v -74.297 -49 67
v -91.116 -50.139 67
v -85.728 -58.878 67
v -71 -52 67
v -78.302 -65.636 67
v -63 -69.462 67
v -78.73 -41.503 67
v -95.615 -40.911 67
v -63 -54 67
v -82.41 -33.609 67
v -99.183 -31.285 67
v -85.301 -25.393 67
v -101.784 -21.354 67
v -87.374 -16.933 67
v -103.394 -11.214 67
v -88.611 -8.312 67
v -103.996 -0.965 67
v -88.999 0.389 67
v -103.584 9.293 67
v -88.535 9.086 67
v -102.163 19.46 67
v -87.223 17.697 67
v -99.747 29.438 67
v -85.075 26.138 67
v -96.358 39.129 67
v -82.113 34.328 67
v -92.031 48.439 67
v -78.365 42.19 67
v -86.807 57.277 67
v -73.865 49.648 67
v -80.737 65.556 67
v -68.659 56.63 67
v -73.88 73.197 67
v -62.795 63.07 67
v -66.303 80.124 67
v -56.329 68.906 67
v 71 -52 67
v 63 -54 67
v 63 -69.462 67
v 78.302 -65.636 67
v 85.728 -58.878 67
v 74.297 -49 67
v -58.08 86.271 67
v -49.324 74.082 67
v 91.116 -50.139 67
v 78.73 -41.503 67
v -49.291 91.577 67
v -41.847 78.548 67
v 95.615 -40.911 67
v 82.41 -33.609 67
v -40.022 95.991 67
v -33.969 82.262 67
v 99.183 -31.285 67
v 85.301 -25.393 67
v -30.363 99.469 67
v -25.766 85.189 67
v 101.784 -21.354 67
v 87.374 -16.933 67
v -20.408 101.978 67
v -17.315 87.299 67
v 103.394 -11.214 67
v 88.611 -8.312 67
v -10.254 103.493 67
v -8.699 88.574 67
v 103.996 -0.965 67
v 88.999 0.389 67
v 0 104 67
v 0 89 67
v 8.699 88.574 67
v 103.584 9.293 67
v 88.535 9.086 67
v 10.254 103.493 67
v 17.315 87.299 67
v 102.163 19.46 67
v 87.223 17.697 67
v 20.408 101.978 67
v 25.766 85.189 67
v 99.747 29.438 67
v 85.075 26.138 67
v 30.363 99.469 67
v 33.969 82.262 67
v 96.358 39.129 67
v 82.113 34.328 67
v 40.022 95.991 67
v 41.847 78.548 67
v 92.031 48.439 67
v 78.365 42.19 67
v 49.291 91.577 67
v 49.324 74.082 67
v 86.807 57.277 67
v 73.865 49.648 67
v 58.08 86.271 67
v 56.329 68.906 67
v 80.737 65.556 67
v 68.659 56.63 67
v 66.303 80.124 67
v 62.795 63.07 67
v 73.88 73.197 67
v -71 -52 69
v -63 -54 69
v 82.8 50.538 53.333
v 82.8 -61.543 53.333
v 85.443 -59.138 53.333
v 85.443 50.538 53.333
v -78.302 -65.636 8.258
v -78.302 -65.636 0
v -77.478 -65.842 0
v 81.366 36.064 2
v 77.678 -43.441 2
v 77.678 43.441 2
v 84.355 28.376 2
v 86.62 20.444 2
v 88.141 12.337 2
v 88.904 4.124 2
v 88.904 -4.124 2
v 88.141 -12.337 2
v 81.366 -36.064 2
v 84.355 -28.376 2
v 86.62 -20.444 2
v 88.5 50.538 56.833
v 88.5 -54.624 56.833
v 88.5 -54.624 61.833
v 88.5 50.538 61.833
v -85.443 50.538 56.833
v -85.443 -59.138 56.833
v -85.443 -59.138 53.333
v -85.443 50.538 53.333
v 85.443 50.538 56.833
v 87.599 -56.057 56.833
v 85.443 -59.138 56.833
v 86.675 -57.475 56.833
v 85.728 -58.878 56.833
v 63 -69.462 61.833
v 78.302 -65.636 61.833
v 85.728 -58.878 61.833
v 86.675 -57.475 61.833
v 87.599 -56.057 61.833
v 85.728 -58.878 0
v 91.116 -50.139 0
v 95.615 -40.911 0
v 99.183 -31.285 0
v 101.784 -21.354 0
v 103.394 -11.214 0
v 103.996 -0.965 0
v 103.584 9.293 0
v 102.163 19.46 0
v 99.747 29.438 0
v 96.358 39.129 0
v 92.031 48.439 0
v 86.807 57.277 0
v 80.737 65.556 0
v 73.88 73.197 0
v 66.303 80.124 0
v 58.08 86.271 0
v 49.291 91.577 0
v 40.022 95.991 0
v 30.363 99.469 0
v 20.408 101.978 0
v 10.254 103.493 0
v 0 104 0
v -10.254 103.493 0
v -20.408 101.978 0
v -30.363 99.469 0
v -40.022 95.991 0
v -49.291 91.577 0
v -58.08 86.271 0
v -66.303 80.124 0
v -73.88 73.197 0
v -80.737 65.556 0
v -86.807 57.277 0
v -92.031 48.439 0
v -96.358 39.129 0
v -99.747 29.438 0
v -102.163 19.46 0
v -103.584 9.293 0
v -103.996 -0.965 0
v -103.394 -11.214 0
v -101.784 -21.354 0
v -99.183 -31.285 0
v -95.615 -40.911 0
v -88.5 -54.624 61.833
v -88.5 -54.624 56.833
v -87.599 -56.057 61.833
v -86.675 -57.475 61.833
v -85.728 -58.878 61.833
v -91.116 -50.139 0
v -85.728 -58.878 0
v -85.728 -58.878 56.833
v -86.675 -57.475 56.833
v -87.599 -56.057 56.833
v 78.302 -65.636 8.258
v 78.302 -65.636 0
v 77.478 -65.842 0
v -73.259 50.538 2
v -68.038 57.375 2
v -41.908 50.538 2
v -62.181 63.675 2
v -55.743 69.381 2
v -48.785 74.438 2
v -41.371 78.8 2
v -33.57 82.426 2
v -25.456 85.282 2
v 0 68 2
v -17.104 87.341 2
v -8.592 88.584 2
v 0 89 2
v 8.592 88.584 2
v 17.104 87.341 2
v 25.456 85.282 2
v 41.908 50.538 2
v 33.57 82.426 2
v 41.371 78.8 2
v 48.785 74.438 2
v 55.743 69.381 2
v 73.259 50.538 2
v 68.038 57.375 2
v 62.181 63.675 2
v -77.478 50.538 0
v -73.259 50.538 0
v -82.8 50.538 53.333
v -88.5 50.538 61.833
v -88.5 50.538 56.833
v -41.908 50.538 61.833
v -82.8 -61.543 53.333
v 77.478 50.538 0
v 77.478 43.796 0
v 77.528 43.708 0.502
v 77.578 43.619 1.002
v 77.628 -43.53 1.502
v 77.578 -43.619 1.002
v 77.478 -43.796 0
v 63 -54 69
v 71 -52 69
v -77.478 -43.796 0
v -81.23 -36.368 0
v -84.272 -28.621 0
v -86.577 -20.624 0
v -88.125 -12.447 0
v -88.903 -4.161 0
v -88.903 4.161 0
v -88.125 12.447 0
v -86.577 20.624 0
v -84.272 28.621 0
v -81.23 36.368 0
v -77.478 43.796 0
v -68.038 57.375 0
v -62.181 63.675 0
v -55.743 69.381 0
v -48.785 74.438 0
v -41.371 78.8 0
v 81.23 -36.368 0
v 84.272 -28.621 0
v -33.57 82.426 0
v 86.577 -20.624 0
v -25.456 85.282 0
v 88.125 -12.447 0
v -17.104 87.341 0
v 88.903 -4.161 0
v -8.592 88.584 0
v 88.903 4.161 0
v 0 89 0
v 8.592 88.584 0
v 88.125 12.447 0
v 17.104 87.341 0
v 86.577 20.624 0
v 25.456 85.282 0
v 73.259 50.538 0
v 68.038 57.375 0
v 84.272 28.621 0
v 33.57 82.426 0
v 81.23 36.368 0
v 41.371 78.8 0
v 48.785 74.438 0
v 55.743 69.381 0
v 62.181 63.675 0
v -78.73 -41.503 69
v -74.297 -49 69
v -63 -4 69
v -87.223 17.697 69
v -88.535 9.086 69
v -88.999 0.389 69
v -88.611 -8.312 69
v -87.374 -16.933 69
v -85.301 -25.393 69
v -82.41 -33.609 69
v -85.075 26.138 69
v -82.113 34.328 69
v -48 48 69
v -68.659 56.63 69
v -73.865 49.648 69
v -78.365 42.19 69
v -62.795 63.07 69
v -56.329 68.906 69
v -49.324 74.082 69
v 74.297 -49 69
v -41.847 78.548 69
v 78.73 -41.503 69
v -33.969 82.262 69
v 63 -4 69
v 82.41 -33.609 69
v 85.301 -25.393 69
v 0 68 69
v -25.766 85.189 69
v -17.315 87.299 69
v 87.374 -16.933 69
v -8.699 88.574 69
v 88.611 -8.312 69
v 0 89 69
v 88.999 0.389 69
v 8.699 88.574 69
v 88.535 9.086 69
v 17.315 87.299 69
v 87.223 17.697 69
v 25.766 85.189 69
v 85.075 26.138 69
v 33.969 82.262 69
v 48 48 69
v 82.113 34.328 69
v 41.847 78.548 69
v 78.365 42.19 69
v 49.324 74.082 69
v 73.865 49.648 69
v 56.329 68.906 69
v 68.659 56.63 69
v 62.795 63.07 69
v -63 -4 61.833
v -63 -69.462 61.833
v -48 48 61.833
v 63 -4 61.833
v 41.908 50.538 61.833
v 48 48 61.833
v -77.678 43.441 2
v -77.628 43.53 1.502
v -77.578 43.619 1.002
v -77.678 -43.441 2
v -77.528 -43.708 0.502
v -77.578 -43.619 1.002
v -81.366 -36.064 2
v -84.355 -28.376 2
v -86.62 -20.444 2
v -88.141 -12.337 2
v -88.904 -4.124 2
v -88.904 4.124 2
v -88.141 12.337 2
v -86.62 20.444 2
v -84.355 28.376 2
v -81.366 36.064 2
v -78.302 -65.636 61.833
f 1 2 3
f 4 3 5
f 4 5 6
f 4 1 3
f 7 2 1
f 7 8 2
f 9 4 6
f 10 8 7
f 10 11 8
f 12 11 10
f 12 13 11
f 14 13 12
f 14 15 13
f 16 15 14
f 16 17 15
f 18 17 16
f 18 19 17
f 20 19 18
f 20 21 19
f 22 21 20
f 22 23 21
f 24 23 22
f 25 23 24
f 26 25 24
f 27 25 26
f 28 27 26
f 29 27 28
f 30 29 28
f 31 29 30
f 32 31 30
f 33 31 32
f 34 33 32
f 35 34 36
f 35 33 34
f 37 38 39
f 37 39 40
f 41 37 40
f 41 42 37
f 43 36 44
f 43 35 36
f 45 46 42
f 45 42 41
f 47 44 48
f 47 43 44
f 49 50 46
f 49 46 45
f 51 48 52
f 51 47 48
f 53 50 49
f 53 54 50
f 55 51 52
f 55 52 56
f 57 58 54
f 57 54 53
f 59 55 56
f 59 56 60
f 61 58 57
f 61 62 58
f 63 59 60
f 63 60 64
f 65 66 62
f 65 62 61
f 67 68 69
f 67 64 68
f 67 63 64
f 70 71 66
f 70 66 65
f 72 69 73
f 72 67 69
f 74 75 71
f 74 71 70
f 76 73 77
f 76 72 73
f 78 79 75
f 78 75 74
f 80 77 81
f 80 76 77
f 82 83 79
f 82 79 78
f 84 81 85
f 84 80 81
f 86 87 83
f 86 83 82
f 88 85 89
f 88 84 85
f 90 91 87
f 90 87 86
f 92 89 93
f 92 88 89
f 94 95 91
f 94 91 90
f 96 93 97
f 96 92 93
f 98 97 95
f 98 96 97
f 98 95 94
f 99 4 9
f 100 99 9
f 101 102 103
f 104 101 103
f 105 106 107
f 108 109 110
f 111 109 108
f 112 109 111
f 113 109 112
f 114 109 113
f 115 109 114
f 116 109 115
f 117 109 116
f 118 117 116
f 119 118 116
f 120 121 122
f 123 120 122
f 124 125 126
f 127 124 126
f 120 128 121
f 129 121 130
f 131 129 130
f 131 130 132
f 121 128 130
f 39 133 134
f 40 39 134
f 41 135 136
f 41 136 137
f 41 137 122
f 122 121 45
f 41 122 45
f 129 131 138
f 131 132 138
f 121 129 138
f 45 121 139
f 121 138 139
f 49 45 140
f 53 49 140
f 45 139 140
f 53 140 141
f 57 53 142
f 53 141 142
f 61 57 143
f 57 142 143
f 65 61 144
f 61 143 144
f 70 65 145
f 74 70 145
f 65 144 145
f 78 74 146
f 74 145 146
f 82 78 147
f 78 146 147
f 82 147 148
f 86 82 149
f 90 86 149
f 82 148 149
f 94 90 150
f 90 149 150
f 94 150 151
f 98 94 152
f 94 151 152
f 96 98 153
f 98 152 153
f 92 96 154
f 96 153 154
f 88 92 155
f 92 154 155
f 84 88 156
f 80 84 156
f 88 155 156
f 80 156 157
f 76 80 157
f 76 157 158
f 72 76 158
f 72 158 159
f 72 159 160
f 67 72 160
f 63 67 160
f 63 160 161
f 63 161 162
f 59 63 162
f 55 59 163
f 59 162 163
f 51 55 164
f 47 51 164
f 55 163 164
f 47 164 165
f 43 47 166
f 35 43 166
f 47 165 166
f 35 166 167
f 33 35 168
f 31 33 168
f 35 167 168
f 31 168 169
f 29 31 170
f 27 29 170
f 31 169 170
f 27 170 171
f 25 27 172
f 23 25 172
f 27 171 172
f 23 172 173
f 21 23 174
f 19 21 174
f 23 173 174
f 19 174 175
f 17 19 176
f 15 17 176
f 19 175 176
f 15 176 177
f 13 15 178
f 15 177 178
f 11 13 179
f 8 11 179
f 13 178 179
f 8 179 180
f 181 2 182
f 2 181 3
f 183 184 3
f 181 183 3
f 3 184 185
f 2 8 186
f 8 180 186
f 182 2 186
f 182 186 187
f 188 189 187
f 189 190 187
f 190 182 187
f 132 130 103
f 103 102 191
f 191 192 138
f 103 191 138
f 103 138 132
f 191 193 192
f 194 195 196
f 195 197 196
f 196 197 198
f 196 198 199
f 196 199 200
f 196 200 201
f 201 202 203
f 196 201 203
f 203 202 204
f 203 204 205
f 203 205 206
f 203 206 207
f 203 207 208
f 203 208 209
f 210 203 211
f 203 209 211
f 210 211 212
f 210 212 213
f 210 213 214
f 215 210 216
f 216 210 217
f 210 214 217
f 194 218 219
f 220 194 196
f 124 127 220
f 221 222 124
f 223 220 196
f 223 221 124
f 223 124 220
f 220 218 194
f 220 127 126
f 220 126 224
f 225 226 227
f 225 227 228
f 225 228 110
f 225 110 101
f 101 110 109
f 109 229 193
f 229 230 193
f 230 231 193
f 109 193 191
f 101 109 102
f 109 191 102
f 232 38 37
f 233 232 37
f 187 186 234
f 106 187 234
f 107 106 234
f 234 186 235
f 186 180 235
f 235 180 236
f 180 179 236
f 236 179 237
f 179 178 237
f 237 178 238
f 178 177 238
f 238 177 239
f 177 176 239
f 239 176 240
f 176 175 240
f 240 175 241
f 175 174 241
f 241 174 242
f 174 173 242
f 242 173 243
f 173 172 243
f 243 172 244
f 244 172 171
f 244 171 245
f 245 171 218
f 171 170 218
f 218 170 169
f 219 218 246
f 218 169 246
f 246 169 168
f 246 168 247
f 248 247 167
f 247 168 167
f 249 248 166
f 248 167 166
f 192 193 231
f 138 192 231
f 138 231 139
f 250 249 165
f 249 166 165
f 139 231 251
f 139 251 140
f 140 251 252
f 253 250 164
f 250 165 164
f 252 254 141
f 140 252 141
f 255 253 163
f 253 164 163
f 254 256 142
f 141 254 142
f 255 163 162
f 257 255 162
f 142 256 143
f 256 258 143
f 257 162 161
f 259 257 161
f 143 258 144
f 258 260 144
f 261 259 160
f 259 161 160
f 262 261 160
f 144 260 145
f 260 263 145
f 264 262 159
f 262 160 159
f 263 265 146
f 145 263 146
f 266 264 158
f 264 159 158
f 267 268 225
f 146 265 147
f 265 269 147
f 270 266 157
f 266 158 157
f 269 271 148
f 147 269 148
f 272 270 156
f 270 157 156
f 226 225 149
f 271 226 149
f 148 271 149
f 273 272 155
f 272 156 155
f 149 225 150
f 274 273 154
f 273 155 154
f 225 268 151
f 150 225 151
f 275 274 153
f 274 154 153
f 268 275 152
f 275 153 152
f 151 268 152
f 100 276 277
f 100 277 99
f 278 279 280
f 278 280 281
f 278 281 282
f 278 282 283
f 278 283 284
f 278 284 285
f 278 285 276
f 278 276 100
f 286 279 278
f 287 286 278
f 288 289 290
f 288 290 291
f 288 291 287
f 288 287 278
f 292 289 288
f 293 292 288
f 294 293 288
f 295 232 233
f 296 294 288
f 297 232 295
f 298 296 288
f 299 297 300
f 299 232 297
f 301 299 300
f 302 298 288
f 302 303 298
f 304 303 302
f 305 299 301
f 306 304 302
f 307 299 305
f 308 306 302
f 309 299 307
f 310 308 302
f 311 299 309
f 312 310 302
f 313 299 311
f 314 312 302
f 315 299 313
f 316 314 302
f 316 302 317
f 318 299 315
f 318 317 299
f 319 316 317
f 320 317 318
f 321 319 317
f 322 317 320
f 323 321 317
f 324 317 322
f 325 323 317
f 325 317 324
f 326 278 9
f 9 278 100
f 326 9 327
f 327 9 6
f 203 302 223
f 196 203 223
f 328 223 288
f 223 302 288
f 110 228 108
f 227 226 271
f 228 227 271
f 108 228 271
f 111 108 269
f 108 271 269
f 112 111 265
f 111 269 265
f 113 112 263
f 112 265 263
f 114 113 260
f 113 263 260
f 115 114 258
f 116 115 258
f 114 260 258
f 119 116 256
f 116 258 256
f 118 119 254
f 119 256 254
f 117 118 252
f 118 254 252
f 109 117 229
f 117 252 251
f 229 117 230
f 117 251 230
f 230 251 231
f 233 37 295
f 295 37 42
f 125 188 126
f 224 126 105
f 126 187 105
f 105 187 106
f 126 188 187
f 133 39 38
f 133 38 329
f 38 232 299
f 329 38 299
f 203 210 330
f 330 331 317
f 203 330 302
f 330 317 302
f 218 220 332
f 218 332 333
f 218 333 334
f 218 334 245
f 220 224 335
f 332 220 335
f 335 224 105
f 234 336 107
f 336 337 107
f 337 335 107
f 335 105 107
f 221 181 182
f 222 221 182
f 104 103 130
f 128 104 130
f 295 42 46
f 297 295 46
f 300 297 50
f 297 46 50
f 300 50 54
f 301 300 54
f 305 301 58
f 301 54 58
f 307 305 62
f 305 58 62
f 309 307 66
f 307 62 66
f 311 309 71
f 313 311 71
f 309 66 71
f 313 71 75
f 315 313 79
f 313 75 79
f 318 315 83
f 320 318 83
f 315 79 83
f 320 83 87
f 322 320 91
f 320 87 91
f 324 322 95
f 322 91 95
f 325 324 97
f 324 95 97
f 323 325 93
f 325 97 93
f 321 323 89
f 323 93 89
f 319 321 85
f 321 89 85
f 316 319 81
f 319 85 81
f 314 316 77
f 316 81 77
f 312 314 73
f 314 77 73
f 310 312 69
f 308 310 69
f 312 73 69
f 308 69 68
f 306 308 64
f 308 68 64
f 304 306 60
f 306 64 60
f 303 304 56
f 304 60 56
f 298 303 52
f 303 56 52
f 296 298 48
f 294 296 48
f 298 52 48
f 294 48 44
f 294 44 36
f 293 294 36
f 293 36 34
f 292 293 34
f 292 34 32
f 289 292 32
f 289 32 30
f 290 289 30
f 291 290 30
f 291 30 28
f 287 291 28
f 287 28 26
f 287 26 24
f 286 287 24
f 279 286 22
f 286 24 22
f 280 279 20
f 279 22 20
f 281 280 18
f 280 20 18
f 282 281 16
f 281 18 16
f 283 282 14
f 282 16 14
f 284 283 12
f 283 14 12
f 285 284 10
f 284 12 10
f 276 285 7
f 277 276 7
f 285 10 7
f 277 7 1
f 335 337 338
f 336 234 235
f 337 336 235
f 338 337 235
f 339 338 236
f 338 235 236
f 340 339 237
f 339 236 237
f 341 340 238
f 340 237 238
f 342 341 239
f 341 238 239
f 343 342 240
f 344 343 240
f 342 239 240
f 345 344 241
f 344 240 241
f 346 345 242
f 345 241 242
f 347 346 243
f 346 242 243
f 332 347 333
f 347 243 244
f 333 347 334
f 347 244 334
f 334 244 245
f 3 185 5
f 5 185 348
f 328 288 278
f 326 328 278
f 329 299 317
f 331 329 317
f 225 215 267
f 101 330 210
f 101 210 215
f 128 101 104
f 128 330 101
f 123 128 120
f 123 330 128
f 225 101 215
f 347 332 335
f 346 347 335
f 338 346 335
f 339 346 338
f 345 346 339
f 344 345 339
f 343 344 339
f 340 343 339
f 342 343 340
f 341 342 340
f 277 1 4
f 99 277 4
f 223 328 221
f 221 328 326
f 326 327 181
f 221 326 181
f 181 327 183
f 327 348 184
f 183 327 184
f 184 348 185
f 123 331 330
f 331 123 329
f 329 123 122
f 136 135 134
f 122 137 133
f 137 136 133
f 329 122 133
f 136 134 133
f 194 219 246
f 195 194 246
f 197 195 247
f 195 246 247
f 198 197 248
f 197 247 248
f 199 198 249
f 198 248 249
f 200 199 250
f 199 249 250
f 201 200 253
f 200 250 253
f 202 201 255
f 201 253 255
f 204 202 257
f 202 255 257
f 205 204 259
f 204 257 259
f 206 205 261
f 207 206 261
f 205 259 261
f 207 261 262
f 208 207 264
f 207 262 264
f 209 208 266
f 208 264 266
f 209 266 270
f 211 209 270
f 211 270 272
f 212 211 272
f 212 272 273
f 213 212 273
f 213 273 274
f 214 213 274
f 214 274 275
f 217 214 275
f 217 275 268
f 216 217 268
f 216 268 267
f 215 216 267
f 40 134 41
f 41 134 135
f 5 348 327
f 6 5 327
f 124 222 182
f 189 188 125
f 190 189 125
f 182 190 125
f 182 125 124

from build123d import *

# Parameters (mm, degrees)
F2_DEPTH  = 2
F4_DEPTH  = 65
F6_DEPTH  = 2
F8_DEPTH  = 25
F9_DEPTH  = 120
F11_DEPTH = 69.001


with BuildPart() as f2:
    # F1 (on face) → F2 (new body)
    with BuildSketch(Plane.XY):
        with BuildLine():
            ThreePointArc((-74.296702, -49), (0, 89), (74.296702, -49))
            Line((74.296702, -49), (71, -52))
            Line((71, -52), (63, -54))
            Line((63, -54), (63, -69.461646))
            Line((63, -69.461646), (78.302185, -65.6361))
            Line((78.302185, -65.6361), (85.728307, -58.878327))
            ThreePointArc((85.728307, -58.878327), (0, 104), (-85.728307, -58.878327))
            Line((-85.728307, -58.878327), (-78.302185, -65.6361))
            Line((-78.302185, -65.6361), (-63, -69.461646))
            Line((-63, -69.461646), (-63, -54))
            Line((-63, -54), (-71, -52))
            Line((-71, -52), (-74.296702, -49))
        make_face()
    extrude(amount=F2_DEPTH)

    # F3 (on face) → F4 (join)
    with BuildSketch(Plane.XY.offset(2)):
        with BuildLine():
            Line((-78.302185, -65.6361), (-63, -69.461646))
            Line((-63, -69.461646), (63, -69.461646))
            Line((63, -69.461646), (78.302185, -65.6361))
            Line((78.302185, -65.6361), (85.728307, -58.878327))
            ThreePointArc((85.728307, -58.878327), (0, 104), (-85.728307, -58.878327))
            Line((-85.728307, -58.878327), (-78.302185, -65.6361))
        make_face()
    extrude(amount=F4_DEPTH)

    # F5 (on face) → F6 (join)
    with BuildSketch(Plane.XY.offset(67)):
        with BuildLine():
            Line((63, -54), (71, -52))
            Line((71, -52), (74.296702, -49))
            ThreePointArc((74.296702, -49), (0, 89), (-74.296702, -49))
            Line((-74.296702, -49), (-71, -52))
            Line((-71, -52), (-63, -54))
            Line((-63, -54), (-63, -69.461646))
            Line((-63, -69.461646), (63, -69.461646))
            Line((63, -69.461646), (63, -54))
        make_face()
    extrude(amount=F6_DEPTH)

    # F7 (on face) → F8 (cut)
    with BuildSketch(Plane.XZ.offset(69.461646)):
        Polygon((88.5, 56.833451), (88.5, 61.833451), (-88.5, 61.833451), (-88.5, 56.833451), (-85.443249, 56.833451), (-85.443249, 53.333451), (-82.8, 53.333451), (-77.27866, -2), (77.27866, -2), (82.8, 53.333451), (85.443249, 53.333451), (85.443249, 56.833451), align=None)
    extrude(amount=F8_DEPTH, mode=Mode.SUBTRACT)

    # F7 (on face) → F9 (cut)
    with BuildSketch(Plane.XZ.offset(69.461646)):
        Polygon((88.5, 56.833451), (88.5, 61.833451), (-88.5, 61.833451), (-88.5, 56.833451), (-85.443249, 56.833451), (-85.443249, 53.333451), (-82.8, 53.333451), (-77.27866, -2), (77.27866, -2), (82.8, 53.333451), (85.443249, 53.333451), (85.443249, 56.833451), align=None)
    extrude(amount=-F9_DEPTH, mode=Mode.SUBTRACT)

    # F10 (on face) → F11 (cut, through all)
    with BuildSketch(Plane.XY.offset(69)):
        Polygon((-63, -4), (-63, -54), (-63, -69.461646), (0, -69.461646), (63, -69.461646), (63, -54), (63, -4), (48, 48), (0, 68), (-48, 48), align=None)
    extrude(amount=-F11_DEPTH, mode=Mode.SUBTRACT)


solid = f2.part
